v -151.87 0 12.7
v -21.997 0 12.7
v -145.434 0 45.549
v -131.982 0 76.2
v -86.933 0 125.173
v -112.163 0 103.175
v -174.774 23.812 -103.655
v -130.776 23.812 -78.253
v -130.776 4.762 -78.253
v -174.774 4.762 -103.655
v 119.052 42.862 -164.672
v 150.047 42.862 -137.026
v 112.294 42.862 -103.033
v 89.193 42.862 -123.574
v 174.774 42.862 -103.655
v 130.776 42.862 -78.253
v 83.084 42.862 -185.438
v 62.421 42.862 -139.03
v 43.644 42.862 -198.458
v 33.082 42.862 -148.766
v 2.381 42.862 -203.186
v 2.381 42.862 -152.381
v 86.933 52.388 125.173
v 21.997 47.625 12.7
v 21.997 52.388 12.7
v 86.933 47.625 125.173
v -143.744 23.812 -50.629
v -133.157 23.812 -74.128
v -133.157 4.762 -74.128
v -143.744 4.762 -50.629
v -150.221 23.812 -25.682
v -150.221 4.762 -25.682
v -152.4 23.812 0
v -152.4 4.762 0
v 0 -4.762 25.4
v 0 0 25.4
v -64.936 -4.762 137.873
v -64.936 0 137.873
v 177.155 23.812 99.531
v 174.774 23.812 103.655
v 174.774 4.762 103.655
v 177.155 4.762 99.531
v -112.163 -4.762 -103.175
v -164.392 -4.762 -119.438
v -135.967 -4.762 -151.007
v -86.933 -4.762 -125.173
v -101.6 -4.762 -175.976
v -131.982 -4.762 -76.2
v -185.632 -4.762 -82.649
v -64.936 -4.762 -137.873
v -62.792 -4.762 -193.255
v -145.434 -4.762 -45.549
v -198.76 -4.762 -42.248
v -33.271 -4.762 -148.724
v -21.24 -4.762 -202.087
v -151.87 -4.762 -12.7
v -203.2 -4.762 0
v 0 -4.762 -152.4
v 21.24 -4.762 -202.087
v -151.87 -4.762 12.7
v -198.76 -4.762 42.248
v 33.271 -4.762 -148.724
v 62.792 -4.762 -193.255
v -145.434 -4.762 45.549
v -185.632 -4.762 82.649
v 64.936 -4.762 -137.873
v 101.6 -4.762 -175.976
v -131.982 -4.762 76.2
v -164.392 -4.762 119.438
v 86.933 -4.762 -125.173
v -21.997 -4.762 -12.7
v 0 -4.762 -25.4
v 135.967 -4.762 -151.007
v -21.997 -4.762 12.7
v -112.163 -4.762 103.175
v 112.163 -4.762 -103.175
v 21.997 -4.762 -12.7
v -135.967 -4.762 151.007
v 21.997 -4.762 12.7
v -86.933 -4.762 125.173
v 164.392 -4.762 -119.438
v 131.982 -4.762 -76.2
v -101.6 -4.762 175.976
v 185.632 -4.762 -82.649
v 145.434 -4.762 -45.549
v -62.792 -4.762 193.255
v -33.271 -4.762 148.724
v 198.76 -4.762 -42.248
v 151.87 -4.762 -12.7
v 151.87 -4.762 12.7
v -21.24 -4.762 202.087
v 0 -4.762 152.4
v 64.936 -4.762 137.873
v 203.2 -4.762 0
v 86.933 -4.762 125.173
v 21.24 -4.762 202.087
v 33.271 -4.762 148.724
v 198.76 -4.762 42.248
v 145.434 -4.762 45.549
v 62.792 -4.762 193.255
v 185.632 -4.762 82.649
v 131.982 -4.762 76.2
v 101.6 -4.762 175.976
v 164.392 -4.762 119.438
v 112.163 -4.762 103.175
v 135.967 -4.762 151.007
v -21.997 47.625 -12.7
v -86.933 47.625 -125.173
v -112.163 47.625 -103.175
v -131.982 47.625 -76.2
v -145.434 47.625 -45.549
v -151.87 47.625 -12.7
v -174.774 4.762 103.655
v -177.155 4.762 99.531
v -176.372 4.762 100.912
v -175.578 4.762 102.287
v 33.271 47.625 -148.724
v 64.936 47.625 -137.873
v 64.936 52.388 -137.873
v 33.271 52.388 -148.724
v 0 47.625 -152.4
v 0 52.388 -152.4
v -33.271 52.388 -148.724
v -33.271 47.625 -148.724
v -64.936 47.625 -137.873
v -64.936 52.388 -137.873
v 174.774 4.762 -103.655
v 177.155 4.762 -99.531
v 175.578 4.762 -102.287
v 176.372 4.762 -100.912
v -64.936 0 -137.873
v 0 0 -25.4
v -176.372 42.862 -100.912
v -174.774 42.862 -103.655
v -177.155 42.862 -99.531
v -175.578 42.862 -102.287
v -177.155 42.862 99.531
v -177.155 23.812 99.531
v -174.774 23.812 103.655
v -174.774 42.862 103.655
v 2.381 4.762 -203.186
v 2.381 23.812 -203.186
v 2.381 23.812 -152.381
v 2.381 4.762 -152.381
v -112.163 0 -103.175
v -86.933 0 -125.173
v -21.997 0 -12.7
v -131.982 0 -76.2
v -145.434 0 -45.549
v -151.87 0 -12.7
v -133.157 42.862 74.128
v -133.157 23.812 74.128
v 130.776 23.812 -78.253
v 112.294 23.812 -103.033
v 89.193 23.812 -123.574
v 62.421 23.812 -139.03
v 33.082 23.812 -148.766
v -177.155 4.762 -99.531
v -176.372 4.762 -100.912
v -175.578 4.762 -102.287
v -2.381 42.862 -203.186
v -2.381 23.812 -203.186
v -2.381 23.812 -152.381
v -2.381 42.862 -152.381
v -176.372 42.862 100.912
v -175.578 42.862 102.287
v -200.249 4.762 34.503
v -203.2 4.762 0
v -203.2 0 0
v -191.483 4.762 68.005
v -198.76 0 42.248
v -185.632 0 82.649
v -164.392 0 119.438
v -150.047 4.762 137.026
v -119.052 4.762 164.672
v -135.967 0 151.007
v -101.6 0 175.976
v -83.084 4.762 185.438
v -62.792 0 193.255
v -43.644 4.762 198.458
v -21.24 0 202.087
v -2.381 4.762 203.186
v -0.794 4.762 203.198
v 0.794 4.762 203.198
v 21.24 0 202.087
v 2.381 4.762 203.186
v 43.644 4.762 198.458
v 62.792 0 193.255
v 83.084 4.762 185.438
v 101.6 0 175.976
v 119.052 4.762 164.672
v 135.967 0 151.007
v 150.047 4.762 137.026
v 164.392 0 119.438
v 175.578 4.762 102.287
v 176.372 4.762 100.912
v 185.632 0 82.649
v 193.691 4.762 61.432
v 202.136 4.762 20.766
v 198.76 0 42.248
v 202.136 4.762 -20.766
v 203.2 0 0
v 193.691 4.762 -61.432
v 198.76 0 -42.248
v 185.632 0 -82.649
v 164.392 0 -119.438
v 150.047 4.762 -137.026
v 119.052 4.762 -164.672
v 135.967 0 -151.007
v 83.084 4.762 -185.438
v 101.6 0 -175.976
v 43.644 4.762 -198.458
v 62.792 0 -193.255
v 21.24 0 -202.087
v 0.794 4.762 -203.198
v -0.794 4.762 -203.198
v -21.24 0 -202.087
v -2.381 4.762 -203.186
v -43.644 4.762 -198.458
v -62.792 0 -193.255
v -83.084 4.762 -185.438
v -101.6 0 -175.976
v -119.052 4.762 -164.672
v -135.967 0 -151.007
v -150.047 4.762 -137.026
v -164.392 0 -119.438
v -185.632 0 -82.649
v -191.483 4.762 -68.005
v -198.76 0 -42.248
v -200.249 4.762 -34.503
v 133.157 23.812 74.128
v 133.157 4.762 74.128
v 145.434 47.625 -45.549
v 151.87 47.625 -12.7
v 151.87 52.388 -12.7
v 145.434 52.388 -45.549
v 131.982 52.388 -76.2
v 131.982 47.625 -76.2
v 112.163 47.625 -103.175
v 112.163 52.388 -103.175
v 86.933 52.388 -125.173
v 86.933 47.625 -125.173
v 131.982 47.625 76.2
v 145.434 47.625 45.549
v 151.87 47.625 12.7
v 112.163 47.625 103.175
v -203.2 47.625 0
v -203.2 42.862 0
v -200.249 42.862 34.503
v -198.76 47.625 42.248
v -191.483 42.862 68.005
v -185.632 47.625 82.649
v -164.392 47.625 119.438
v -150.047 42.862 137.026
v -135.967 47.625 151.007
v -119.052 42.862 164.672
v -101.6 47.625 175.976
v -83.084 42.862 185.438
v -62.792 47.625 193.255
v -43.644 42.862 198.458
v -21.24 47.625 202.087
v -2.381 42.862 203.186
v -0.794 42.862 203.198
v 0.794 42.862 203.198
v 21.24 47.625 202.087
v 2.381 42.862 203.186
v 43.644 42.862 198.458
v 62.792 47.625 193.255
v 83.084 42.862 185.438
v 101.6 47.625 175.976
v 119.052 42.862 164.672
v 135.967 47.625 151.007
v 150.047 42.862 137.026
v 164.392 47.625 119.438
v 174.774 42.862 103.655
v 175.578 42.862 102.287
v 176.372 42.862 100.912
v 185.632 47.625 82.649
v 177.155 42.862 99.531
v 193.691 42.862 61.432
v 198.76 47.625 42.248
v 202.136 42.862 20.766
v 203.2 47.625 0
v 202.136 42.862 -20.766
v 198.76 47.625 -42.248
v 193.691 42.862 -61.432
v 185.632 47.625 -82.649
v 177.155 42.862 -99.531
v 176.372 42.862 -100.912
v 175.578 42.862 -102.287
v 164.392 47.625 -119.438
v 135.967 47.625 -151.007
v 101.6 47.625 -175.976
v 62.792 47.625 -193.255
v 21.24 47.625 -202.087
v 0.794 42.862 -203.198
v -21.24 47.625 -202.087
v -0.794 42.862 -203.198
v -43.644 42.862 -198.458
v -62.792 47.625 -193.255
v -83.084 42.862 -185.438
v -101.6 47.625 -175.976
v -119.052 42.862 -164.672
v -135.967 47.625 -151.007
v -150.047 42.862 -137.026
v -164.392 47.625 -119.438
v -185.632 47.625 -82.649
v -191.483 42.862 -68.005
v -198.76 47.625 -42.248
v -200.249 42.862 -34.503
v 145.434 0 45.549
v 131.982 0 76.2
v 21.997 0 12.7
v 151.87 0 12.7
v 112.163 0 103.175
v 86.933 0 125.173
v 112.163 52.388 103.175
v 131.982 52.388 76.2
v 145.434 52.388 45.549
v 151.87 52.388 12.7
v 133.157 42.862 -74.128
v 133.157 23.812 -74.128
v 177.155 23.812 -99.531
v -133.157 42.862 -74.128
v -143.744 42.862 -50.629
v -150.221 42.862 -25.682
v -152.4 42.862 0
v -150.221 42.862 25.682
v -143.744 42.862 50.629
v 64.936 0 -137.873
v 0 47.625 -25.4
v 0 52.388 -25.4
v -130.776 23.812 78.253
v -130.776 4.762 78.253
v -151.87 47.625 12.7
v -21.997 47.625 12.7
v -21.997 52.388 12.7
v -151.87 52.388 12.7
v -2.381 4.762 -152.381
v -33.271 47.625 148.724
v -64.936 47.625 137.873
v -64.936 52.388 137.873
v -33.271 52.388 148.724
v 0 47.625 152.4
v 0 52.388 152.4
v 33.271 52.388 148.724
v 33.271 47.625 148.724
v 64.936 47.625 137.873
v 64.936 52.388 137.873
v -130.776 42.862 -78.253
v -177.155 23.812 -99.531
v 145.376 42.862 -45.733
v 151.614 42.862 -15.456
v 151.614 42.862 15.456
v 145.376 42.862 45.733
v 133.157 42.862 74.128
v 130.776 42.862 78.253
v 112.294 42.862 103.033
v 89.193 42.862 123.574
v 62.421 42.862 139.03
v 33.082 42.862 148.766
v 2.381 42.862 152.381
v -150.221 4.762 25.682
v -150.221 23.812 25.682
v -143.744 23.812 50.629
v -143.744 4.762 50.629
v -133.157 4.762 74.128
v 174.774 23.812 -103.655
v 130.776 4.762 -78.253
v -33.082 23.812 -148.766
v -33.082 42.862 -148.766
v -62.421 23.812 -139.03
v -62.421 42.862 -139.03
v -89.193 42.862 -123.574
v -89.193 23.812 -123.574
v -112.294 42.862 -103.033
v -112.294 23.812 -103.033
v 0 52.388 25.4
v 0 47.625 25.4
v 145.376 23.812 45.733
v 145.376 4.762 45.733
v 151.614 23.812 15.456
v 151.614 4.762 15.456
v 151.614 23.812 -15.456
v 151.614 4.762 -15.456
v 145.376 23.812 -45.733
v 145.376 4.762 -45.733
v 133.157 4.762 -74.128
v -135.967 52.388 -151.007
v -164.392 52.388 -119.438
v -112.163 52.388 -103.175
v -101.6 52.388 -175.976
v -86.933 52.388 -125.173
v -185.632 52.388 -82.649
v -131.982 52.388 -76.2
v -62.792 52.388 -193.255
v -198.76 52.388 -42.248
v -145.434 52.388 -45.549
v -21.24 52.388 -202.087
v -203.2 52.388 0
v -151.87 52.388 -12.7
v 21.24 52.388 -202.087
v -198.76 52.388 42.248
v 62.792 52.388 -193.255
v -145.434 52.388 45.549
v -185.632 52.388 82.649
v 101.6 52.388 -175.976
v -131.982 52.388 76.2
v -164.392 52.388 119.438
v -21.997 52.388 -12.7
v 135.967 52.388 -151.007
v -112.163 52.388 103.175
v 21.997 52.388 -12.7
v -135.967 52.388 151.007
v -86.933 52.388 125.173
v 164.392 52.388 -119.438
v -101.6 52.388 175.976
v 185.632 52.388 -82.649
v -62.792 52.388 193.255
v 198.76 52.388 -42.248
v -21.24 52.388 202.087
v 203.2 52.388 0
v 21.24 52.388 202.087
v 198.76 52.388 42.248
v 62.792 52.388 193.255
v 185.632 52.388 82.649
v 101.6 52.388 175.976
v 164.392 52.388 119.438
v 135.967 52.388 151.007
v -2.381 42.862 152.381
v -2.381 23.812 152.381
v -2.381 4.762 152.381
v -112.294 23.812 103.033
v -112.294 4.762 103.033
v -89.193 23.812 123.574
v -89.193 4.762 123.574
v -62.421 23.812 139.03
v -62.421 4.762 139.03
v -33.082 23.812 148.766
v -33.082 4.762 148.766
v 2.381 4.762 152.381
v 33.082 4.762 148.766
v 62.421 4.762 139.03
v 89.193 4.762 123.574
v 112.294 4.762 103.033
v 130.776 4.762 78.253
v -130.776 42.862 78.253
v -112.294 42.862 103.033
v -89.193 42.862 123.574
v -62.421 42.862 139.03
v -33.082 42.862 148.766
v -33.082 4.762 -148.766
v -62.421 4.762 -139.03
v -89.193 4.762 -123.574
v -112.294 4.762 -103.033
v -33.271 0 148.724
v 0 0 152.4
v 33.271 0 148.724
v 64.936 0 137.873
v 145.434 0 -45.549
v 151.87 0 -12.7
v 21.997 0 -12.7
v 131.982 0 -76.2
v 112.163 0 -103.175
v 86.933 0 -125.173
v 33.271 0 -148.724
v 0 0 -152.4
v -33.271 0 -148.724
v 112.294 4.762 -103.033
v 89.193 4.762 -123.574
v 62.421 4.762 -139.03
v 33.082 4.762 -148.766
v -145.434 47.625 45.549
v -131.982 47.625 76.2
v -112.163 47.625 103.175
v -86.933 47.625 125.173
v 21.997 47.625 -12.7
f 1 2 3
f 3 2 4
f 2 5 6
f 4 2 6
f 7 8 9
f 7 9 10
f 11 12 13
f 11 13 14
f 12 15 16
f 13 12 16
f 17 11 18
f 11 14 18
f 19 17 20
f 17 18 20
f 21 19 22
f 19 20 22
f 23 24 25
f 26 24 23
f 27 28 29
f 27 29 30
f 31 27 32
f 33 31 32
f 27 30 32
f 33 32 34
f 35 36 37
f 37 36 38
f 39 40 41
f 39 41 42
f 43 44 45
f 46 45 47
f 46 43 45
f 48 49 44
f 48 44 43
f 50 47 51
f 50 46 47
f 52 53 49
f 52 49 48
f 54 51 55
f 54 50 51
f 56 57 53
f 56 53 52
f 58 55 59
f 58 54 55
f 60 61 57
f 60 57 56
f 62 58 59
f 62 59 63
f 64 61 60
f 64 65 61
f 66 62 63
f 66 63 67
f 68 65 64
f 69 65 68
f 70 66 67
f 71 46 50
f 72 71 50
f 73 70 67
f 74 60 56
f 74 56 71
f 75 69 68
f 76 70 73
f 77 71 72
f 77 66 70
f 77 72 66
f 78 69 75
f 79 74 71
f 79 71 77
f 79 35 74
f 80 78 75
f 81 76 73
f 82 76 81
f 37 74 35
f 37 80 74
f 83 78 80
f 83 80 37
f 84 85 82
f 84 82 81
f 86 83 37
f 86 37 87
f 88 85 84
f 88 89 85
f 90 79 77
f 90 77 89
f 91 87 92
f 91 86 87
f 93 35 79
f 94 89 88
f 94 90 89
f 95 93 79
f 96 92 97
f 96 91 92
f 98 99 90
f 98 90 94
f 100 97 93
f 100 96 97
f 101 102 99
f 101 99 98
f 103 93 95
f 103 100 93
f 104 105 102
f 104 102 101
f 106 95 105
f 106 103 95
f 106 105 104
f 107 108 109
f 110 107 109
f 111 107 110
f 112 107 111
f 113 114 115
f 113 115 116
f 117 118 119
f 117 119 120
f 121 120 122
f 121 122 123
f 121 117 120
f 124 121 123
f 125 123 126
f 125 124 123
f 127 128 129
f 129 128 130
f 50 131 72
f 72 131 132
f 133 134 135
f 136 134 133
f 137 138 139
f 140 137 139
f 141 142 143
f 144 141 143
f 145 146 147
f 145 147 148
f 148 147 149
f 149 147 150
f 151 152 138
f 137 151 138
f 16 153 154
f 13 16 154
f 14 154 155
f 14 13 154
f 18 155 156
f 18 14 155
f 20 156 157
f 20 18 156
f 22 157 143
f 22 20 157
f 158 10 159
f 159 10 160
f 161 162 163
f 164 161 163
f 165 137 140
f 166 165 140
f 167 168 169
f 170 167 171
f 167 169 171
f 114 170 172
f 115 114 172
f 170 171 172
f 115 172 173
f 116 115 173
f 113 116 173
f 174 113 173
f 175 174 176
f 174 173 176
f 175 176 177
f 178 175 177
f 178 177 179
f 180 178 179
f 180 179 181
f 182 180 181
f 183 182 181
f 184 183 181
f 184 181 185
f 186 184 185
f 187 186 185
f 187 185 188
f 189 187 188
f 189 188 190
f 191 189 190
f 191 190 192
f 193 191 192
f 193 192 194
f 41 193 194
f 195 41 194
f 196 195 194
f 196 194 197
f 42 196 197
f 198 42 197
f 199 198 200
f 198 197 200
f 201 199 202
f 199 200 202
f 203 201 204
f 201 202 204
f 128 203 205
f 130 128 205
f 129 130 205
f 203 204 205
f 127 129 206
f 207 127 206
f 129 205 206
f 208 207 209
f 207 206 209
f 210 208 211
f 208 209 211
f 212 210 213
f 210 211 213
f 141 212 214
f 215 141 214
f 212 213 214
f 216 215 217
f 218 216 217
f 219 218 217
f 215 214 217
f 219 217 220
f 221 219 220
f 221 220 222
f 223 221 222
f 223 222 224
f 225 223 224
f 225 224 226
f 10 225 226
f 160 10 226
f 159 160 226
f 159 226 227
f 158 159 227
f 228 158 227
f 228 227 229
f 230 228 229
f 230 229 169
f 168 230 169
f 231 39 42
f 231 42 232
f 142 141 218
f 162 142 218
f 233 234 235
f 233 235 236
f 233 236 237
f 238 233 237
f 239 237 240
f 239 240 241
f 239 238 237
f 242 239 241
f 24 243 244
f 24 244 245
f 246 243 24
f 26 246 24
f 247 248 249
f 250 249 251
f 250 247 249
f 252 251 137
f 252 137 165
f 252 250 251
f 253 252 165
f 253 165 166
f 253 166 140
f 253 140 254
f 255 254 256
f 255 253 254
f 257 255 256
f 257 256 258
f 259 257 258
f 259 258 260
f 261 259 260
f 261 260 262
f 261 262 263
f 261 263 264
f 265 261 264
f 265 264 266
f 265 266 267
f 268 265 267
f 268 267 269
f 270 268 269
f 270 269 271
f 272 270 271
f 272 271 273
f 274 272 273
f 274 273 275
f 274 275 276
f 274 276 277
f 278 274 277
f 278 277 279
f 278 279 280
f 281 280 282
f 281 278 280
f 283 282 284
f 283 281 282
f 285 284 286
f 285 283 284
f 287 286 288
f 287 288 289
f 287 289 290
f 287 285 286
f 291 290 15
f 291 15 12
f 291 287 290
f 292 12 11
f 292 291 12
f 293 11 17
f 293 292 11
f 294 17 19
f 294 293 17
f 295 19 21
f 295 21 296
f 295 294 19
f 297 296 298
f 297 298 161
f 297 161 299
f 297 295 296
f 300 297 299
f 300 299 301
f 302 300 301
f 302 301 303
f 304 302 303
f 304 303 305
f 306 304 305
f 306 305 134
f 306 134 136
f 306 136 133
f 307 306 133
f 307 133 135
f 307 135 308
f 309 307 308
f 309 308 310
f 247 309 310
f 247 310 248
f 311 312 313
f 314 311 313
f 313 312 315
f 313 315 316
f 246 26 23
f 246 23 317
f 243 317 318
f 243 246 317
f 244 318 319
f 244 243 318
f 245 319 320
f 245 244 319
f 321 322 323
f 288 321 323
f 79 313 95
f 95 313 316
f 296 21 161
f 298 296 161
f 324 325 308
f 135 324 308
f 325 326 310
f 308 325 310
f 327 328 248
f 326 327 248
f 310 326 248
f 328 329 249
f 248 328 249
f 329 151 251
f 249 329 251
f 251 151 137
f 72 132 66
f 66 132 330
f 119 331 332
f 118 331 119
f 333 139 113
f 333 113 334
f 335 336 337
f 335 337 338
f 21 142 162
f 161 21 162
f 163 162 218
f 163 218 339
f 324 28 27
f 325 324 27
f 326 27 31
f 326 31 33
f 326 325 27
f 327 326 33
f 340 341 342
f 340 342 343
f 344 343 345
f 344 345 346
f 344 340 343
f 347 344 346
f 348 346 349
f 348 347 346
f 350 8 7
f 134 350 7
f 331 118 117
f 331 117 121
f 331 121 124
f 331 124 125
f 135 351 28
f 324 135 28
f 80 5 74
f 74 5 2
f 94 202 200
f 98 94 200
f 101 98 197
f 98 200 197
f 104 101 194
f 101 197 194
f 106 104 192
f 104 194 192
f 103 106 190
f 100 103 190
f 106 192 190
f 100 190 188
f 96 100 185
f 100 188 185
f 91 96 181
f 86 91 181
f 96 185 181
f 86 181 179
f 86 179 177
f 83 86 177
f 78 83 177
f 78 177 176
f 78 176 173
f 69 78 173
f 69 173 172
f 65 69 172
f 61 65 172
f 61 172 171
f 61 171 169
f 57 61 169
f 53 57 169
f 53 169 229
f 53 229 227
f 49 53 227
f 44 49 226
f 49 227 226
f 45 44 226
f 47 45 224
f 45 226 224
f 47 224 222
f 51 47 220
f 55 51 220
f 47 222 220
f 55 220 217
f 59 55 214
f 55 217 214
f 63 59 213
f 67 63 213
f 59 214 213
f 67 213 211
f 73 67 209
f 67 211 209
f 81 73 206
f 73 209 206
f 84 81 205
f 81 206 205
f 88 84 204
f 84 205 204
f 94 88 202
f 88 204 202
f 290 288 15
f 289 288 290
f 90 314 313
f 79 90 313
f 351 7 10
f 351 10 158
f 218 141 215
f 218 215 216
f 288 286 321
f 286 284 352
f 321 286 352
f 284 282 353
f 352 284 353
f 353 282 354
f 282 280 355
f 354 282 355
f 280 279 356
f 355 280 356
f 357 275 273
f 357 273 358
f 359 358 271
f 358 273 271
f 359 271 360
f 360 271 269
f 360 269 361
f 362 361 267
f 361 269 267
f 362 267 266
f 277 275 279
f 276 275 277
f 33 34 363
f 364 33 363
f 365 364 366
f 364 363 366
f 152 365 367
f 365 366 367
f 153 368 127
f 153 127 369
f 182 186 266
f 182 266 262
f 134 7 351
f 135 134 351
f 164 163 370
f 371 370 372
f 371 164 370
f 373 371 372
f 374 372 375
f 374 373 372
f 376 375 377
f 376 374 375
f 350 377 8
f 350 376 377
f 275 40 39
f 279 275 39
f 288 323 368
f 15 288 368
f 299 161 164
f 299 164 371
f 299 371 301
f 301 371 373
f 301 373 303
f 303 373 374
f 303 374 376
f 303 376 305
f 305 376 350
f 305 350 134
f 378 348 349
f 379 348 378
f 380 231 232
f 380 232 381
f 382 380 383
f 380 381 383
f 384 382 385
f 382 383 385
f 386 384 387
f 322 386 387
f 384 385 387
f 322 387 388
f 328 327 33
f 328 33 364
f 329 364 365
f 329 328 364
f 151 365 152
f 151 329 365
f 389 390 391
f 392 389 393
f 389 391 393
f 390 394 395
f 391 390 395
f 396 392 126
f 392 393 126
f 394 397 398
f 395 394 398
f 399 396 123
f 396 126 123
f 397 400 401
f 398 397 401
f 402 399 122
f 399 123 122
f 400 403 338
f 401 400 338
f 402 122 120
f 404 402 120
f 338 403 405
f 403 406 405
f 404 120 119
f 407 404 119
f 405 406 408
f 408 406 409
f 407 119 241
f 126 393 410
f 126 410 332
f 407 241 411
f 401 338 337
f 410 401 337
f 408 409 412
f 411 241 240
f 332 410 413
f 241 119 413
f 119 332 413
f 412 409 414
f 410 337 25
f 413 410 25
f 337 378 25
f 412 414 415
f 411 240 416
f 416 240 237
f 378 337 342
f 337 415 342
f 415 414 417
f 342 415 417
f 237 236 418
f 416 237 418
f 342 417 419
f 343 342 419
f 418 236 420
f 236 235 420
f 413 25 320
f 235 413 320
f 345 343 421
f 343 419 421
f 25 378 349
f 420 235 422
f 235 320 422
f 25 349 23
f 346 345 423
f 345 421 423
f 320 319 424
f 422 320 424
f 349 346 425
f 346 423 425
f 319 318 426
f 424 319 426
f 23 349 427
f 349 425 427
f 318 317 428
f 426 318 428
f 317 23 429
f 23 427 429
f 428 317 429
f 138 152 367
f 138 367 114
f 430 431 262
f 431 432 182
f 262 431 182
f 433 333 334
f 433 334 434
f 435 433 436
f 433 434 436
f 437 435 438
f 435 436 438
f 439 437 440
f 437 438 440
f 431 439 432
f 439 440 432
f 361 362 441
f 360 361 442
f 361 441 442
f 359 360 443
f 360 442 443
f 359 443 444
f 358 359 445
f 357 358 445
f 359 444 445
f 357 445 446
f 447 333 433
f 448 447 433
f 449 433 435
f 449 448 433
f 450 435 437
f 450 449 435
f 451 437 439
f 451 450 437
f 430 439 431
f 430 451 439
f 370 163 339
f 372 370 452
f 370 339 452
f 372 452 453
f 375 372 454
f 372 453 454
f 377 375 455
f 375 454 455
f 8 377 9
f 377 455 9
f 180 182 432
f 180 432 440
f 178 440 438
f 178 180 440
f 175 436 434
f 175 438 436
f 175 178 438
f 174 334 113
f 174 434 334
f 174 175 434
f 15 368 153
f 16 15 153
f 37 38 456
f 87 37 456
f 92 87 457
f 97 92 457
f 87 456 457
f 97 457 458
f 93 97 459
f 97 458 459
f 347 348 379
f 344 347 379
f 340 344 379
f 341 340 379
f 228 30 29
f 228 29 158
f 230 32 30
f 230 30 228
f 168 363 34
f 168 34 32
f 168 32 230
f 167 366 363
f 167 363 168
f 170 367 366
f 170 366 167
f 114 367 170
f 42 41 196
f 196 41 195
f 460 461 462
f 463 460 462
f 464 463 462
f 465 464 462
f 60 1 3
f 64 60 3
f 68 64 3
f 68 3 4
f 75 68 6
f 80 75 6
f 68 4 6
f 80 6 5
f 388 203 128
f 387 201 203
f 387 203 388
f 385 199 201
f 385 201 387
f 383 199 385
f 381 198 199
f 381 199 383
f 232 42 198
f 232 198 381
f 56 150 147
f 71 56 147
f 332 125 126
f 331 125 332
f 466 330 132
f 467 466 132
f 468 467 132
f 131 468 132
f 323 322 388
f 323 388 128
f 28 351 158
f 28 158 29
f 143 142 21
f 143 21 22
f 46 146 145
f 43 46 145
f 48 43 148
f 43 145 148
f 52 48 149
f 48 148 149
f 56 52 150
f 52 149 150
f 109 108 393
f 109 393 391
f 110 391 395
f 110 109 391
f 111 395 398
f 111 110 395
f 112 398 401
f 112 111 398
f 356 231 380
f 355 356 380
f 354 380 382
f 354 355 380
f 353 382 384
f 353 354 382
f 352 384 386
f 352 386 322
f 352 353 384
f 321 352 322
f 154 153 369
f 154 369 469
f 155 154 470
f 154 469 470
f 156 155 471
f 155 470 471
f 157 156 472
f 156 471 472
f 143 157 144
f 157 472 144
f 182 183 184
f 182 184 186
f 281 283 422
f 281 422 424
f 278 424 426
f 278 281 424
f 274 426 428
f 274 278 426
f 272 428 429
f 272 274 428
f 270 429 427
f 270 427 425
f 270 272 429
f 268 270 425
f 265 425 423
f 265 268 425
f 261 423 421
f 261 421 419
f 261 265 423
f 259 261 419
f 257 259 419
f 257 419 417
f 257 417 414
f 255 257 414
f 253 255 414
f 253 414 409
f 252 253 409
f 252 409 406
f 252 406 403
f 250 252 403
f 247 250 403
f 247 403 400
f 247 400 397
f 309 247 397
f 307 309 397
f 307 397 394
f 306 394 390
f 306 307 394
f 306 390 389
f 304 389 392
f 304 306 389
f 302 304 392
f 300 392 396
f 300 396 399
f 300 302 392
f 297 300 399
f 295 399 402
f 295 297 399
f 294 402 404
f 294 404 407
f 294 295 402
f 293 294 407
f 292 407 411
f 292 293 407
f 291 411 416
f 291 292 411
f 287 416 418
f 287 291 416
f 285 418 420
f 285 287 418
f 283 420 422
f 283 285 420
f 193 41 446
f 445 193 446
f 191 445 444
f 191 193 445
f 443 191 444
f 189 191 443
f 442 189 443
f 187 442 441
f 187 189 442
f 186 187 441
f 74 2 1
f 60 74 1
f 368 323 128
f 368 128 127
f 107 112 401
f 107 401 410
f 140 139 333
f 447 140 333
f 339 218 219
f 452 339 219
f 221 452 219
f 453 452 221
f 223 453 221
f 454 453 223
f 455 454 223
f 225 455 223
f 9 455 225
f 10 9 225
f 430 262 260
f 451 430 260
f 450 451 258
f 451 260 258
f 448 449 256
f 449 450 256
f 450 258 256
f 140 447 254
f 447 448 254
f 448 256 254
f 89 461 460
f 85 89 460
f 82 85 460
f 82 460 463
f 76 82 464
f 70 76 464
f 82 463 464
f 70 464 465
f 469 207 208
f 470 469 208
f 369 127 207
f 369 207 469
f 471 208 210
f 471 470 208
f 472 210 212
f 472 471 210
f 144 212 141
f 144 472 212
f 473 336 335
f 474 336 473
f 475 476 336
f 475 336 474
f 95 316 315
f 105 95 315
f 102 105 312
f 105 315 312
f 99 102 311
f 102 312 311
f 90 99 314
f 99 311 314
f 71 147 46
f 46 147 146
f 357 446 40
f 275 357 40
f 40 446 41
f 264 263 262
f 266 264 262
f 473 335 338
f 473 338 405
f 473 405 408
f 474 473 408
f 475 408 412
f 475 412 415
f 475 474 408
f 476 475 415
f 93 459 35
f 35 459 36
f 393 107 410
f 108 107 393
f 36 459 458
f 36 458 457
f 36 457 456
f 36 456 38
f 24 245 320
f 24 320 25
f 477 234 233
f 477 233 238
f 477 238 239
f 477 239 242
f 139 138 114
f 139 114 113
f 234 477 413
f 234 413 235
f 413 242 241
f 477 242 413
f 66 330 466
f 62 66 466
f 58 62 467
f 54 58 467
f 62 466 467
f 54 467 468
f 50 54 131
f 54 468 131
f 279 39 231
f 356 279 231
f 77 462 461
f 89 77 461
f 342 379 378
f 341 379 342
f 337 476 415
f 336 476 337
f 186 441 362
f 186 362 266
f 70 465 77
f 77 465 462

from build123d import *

# Parameters (mm, degrees)
F0_R           = 203.2
F1_DEPTH       = 4.7625
F2_R           = 203.2
F3_DEPTH       = 4.7625
F4_R           = 152.4
F5_DEPTH       = 19.05
F6_W           = 4.7625
F6_H           = 158.7546515355
F7_DEPTH       = 19.05
F10_DEPTH      = 19.05
F10_DEPTH_BACK = 19.05


with BuildPart() as f1:
    # F0 (on Front) → F1 (new body)
    with BuildSketch(Plane.XZ):
        Circle(F0_R)
        with BuildLine():
            ThreePointArc((-86.9334783468, -125.1732013753), (-131.9822715367, -76.2), (-151.8699114374, -12.7))
            Line((-151.8699114374, -12.7), (-21.9970452561, -12.7))
            Line((-21.9970452561, -12.7), (-86.9334783468, -125.1732013753))
        make_face(mode=Mode.SUBTRACT)
        with BuildLine():
            ThreePointArc((64.9364330906, -137.8732013753), (0, -152.4), (-64.9364330906, -137.8732013753))
            Line((-64.9364330906, -137.8732013753), (0, -25.4))
            Line((0, -25.4), (64.9364330906, -137.8732013753))
        make_face(mode=Mode.SUBTRACT)
        with BuildLine():
            Line((21.9970452561, -12.7), (151.8699114374, -12.7))
            ThreePointArc((151.8699114374, -12.7), (131.9822715367, -76.2), (86.9334783468, -125.1732013753))
            Line((86.9334783468, -125.1732013753), (21.9970452561, -12.7))
        make_face(mode=Mode.SUBTRACT)
        with BuildLine():
            ThreePointArc((-151.8699114374, 12.7), (-131.9822715367, 76.2), (-86.9334783468, 125.1732013753))
            Line((-86.9334783468, 125.1732013753), (-21.9970452561, 12.7))
            Line((-21.9970452561, 12.7), (-151.8699114374, 12.7))
        make_face(mode=Mode.SUBTRACT)
        with BuildLine():
            ThreePointArc((-64.9364330906, 137.8732013753), (0, 152.4), (64.9364330906, 137.8732013753))
            Line((64.9364330906, 137.8732013753), (0, 25.4))
            Line((0, 25.4), (-64.9364330906, 137.8732013753))
        make_face(mode=Mode.SUBTRACT)
        with BuildLine():
            ThreePointArc((86.9334783468, 125.1732013753), (131.9822715367, 76.2), (151.8699114374, 12.7))
            Line((151.8699114374, 12.7), (21.9970452561, 12.7))
            Line((21.9970452561, 12.7), (86.9334783468, 125.1732013753))
        make_face(mode=Mode.SUBTRACT)
    extrude(amount=F1_DEPTH)

    # F2 (on face) → F3 (join)
    with BuildSketch(Plane(origin=(0, 0, 0), x_dir=(-1, 0, 0), z_dir=(0, 1, 0))):
        Circle(F2_R)
    extrude(amount=F3_DEPTH)

    # F4 (on face) → F5 (join)
    with BuildSketch(Plane(origin=(0, 4.7625, 0), x_dir=(-1, 0, 0), z_dir=(0, 1, 0))):
        Circle(F4_R)
    extrude(amount=F5_DEPTH)

    # F6 (on face) → F7 (cut, through all)
    with BuildSketch(Plane(origin=(0, 23.8125, 0), x_dir=(-1, 0, 0), z_dir=(0, 1, 0))):
        with Locations((0, 123.8087211165)):
            Rectangle(F6_W, F6_H)
        Polygon((-37.2880920976, 24.2779206671), (-174.7736532963, 103.6552464349), (-177.1549032963, 99.5308004494), (-39.6693420976, 20.1534746816), align=None)
        Polygon((-39.6693420976, -20.1534746816), (-177.1549032963, -99.5308004494), (-174.7736532963, -103.6552464349), (-37.2880920976, -24.2779206671), align=None)
        with Locations((0, -123.8087211165)):
            Rectangle(F6_W, F6_H)
        Polygon((37.2880920976, -24.2779206671), (174.7736532963, -103.6552464349), (177.1549032963, -99.5308004494), (39.6693420976, -20.1534746816), align=None)
        Polygon((39.6693420976, 20.1534746816), (177.1549032963, 99.5308004494), (174.7736532963, 103.6552464349), (37.2880920976, 24.2779206671), align=None)
    extrude(amount=-F7_DEPTH, mode=Mode.SUBTRACT)

    # F9: F1 across plane


with BuildPart() as f1_1:
    add(f1.part)
    add(f1.part.mirror(Plane(origin=(0, 23.8125, 0), x_dir=(-1, 0, 0), z_dir=(0, 1, 0))))

    # F6 (on face) → F10 (join, two sides)
    with BuildSketch(Plane(origin=(0, 23.8125, 0), x_dir=(-1, 0, 0), z_dir=(0, 1, 0))) as f10_sk:
        with Locations((0, 123.8087211165)):
            Rectangle(F6_W, F6_H)
        Polygon((-37.2880920976, 24.2779206671), (-174.7736532963, 103.6552464349), (-177.1549032963, 99.5308004494), (-39.6693420976, 20.1534746816), align=None)
        Polygon((-39.6693420976, -20.1534746816), (-177.1549032963, -99.5308004494), (-174.7736532963, -103.6552464349), (-37.2880920976, -24.2779206671), align=None)
        with Locations((0, -123.8087211165)):
            Rectangle(F6_W, F6_H)
        Polygon((37.2880920976, -24.2779206671), (174.7736532963, -103.6552464349), (177.1549032963, -99.5308004494), (39.6693420976, -20.1534746816), align=None)
        Polygon((39.6693420976, 20.1534746816), (177.1549032963, 99.5308004494), (174.7736532963, 103.6552464349), (37.2880920976, 24.2779206671), align=None)
    extrude(amount=-F10_DEPTH)
    extrude(f10_sk.sketch, amount=F10_DEPTH_BACK)


solid = f1_1.part
